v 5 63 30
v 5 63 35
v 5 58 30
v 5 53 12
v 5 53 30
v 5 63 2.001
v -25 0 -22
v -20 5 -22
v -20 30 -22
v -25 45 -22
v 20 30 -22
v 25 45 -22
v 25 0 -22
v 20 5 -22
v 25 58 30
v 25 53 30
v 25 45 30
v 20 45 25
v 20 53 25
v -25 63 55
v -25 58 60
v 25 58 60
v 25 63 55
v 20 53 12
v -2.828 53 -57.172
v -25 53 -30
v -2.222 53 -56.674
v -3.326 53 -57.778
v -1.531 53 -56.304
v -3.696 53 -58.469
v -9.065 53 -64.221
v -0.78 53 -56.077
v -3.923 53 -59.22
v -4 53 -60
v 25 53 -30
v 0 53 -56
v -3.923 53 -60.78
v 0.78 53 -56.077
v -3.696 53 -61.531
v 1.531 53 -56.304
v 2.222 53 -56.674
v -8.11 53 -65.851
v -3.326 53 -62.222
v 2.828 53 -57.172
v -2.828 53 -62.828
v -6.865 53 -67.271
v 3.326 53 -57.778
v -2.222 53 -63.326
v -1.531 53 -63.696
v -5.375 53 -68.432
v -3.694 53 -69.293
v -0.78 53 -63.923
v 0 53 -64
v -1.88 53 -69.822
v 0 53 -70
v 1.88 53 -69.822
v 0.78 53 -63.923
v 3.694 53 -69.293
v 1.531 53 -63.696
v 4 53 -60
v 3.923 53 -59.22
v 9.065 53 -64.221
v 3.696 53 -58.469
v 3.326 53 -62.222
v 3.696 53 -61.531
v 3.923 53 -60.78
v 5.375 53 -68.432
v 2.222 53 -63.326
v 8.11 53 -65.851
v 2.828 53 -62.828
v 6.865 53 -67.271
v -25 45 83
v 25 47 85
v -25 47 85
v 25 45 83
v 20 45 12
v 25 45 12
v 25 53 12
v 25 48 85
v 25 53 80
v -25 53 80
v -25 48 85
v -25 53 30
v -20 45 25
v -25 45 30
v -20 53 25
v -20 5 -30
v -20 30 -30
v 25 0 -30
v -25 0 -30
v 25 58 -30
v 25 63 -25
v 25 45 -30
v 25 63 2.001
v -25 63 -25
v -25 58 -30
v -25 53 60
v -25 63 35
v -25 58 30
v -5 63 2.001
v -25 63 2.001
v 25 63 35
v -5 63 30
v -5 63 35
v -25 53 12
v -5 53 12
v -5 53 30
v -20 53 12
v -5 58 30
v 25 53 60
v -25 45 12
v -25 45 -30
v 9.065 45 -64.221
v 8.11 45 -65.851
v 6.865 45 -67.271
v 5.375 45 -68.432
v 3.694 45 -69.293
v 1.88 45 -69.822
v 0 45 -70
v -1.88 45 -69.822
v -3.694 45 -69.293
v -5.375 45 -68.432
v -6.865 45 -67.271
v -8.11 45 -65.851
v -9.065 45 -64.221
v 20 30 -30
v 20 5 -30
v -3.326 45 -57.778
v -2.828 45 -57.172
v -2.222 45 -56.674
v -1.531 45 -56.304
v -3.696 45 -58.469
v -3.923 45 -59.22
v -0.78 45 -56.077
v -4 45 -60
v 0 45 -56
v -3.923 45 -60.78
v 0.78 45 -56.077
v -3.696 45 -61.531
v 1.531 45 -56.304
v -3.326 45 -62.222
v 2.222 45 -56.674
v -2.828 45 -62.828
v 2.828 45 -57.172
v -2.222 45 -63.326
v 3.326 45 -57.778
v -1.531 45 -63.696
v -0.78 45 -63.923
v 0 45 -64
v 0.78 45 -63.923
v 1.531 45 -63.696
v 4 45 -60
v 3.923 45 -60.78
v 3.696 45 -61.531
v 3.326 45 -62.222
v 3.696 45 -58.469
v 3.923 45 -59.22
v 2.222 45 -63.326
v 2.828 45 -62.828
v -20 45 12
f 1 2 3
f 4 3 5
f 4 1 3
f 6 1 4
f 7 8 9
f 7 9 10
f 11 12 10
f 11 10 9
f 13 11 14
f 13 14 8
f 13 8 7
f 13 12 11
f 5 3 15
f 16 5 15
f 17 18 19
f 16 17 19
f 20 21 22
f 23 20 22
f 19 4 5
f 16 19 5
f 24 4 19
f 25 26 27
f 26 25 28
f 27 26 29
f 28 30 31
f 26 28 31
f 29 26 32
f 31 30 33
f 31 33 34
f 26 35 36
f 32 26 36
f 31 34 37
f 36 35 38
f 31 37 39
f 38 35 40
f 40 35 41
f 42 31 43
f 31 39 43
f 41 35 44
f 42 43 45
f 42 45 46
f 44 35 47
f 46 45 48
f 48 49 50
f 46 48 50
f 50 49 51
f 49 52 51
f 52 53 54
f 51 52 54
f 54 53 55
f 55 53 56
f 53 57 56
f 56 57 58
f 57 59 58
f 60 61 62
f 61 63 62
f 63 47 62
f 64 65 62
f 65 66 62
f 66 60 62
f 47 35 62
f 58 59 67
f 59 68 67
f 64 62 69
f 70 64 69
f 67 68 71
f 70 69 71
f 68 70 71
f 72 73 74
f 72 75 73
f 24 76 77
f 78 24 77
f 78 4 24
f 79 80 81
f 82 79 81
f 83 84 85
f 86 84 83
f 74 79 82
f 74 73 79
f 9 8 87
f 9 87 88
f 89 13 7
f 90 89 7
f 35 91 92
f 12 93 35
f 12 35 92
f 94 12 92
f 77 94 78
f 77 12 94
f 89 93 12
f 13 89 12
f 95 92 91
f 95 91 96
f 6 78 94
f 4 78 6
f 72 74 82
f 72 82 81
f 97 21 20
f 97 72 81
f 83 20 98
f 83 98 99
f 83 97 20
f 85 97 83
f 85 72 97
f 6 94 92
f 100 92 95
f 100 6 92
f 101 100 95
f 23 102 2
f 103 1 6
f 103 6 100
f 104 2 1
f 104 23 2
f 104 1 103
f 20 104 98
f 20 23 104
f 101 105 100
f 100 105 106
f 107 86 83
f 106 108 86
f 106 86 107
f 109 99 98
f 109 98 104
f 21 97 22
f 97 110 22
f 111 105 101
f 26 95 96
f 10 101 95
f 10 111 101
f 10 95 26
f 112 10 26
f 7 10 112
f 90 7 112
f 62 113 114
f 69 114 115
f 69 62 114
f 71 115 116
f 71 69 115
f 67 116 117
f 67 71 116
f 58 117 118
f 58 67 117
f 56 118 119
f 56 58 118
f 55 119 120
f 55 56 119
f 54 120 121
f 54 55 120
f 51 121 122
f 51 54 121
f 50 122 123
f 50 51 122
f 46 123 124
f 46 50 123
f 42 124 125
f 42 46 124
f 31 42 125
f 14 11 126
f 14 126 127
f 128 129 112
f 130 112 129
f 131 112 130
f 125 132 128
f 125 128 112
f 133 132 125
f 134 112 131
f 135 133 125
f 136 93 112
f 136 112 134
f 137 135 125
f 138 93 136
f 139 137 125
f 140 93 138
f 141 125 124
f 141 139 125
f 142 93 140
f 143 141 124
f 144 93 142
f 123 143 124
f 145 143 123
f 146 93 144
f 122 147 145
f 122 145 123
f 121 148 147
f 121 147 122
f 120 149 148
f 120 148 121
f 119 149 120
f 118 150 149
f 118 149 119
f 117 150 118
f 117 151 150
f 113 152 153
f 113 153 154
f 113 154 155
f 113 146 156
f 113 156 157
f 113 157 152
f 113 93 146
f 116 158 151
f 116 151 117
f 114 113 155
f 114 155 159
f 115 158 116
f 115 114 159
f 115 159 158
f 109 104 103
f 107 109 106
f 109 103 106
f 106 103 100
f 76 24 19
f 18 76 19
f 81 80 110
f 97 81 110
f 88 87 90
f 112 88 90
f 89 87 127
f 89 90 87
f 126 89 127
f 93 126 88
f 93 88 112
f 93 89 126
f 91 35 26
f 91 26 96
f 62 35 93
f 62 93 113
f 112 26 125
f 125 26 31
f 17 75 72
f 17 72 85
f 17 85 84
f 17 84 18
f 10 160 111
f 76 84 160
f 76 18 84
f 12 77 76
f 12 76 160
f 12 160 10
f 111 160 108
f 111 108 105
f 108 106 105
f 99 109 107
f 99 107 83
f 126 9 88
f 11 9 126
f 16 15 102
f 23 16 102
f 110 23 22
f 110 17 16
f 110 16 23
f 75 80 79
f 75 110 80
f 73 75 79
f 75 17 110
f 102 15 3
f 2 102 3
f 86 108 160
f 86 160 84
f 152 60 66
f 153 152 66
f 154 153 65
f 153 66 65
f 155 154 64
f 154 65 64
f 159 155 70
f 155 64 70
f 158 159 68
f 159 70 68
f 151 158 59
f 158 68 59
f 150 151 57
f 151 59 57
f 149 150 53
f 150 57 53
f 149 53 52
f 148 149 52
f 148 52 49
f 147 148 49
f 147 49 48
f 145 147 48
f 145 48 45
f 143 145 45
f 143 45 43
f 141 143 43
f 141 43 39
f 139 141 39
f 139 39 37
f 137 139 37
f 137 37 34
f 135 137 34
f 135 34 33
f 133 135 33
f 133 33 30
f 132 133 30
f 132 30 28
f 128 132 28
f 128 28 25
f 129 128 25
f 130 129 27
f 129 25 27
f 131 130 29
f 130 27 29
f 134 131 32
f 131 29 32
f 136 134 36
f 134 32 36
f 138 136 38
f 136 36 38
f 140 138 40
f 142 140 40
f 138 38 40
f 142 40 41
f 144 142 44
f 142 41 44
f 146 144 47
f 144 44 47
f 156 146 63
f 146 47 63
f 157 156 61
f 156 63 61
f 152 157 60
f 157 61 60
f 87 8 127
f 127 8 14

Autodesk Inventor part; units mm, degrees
ref_plane "YZ Plane" through (0, 0, 0) normal (1, 0, 0) x (0, 1, 0)
ref_plane "XZ Plane" through (0, 0, 0) normal (0, 1, 0) x (-1, 0, 0)
ref_plane "XY Plane" through (0, 0, 0) normal (0, 0, 1) x (1, 0, 0)
sketch "Sketch1" plane through (0, 0, 0) normal (0, 1, 0) x (-1, 0, 0)
  line L0 (0, 85) -> (0, -85)
  line L1 (25, 0) -> (-25, 0)
  line L2 (0, 85) -> (25, 85)
  line L3 (25, 85) -> (25, -85)
  line L4 (25, -85) -> (-25, -85)
  line L5 (-25, -85) -> (-25, 85)
  line L6 (-25, 85) -> (0, 85)
  point P0 (0, 0)
  point P1 (0, 0)
  point P2 (0, 0)
  dimension "d1" = 50
extrude "Extrusion1" add sketch "Sketch1" along normal blind 63
sketch "Sketch2" plane through (25, 0, 85) normal (1, 0, 0) x (0, 0, -1)
  line L0 (0, 0) -> (170, 0) projected
  line L1 (170, 0) -> (170, 63) projected
  line L2 (0, 63) -> (170, 63) projected
  line L3 (0, 0) -> (0, 63) projected
  line L4 (0, 0) -> (170, 0) projected
  line L5 (0, 0) -> (0, 45)
  line L6 (0, 0) -> (0, 63) projected
  line L7 (0, 45) -> (107, 45)
  line L8 (107, 45) -> (107, 0)
  point P0 (85, 0)
  dimension "d4" = 45
  dimension "d5" = 107
extrude "Extrusion2" cut sketch "Sketch2" against normal up to next contours L3 L7 L8 L0
sketch "Sketch3" plane through (25, 0, -22) normal (0, 0, 1) x (1, 0, 0)
  line L0 (-50, 0) -> (-50, 45) projected
  line L1 (0, 0) -> (-50, 0) projected
  line L2 (0, 45) -> (0, 0) projected
  line L3 (0, 45) -> (-50, 45) projected
  line L4 (-45, 5) -> (-5, 5)
  line L5 (-5, 30) -> (-5, 5)
  line L6 (-45, 5) -> (-45, 30)
  line L7 (-45, 30) -> (-5, 30)
  point P0 (-25, 0)
  dimension "d10" = 25
  dimension "d11" = 5
  dimension "d12" = 5
  dimension "d13" = 5
extrude "Extrusion3" cut sketch "Sketch3" against normal up to next contours L6 L7 L5 L4
sketch "Sketch4" plane through (25, 0, -85) normal (1, 0, 0) x (0, 0, -1)
  line L0 (-63, 45) -> (-63, 0) projected
  line L1 (-63, 0) -> (0, 0) projected
  line L2 (0, 0) -> (0, 63) projected
  line L3 (-170, 63) -> (0, 63) projected
  line L4 (-170, 45) -> (-170, 63) projected
  line L5 (-170, 45) -> (-63, 45) projected
  line L6 (-170, 45) -> (-165, 45)
  line L7 (-170, 45) -> (-63, 45) projected
  line L8 (-165, 45) -> (-165, 63)
  line L9 (-170, 63) -> (0, 63) projected
  line L10 (-170, 45) -> (-170, 53)
  line L11 (-170, 45) -> (-170, 63) projected
  line L12 (-170, 53) -> (-165, 53)
  line L13 (-170, 53) -> (-170, 63)
  point P0 (-85, 0)
  dimension "d16" = 5
  dimension "d20" = 8
chamfer "Chamfer1" distance 2 angle 45 1 edges at (0, 45, 85)
extrude "Extrusion4" cut sketch "Sketch4" against normal up to next contours L12 L4 L3 L8
chamfer "Chamfer2" distance 5 angle 45 1 edges at (0, 53, 85)
sketch "Sketch5" plane through (25, 0, -85) normal (1, 0, 0) x (0, 0, -1)
  line L0 (-170, 48) -> (-165, 53) projected
  line L1 (-170, 47) -> (-170, 48) projected
  line L2 (-168, 45) -> (-170, 47) projected
  line L3 (-168, 45) -> (-63, 45) projected
  line L4 (-63, 45) -> (-63, 0) projected
  line L5 (-63, 0) -> (0, 0) projected
  line L6 (0, 0) -> (0, 63) projected
  line L7 (-165, 63) -> (0, 63) projected
  line L8 (-165, 63) -> (-165, 53) projected
  line L9 (-165, 53) -> (-165, 63) projected
  line L10 (-165, 53) -> (-145, 53)
  line L11 (-145, 53) -> (-145, 63)
  point P0 (-85, 0)
  dimension "d26" = 20
extrude "Extrusion5" cut sketch "Sketch5" against normal up to next contours L8 L7 L11 L10
chamfer "Chamfer3" distance 5 angle 45 1 edges at (0, 63, 60)
sketch "Sketch6" plane through (25, 0, -85) normal (1, 0, 0) x (0, 0, -1)
  line L0 (-145, 58) -> (-140, 63) projected
  line L1 (-145, 58) -> (-145, 53) projected
  line L2 (-145, 53) -> (-165, 53) projected
  line L3 (-170, 48) -> (-165, 53) projected
  line L4 (-170, 47) -> (-170, 48) projected
  line L5 (-168, 45) -> (-170, 47) projected
  line L6 (-168, 45) -> (-63, 45) projected
  line L7 (-63, 45) -> (-63, 0) projected
  line L8 (-63, 0) -> (0, 0) projected
  line L9 (0, 0) -> (0, 63) projected
  line L10 (-140, 63) -> (0, 63) projected
  line L11 (-170, 47) -> (-170, 0)
  line L12 (-170, 0) -> (-40, 0)
  line L13 (-63, 0) -> (0, 0) projected
  line L14 (-170, 0) -> (-55, 0)
  line L15 (-55, 0) -> (-55, 45)
  line L16 (-55, 45) -> (0, 45)
  line L17 (0, 0) -> (0, 63) projected
  line L18 (-55, 45) -> (-55, 53)
  line L19 (-55, 53) -> (0, 53)
  line L20 (-55, 53) -> (-55, 63)
  line L21 (0, 63) -> (-140, 63) projected
  line L22 (-55, 63) -> (0, 63)
  point P0 (-85, 0)
  dimension "d32" = 130
  dimension "d33" = 115
  dimension "d34" = 8
extrude "Extrusion6" cut sketch "Sketch6" against normal up to next contours L10 L9 L19 L20 | L16 L9 L8 L15
sketch "Sketch7" plane through (25, 53, -30) normal (0, 1, 0) x (1, 0, 0)
  line L0 (-50, 0) -> (-50, 55) projected
  line L1 (0, 0) -> (-50, 0) projected
  line L2 (0, 55) -> (0, 0) projected
  line L3 (-50, 55) -> (0, 55) projected
  line L4 (0, 0) -> (0, 30)
  line L5 (0, 0) -> (0, 55) projected
  line L6 (0, 30) -> (-50, 30)
  line L7 (-25, -30) -> (-25, 55)
  circle A0 centre (-25, 30) radius 4
  circle A1 centre (-25, 30) radius 10
  line L8 (0, 0) -> (-15.9346, 34.2212)
  line L9 (-50, 0) -> (-34.0654, 34.2212)
  dimension "d37" = 30
  dimension "d38" = 8
  dimension "d39" = 20
extrude "Extrusion7" cut sketch "Sketch7" against normal up to next contours L0 L6 L9 | L0 L3 L7 A1 L9 L6 | L8 L6 L2 | L3 L2 L6 L8 A1 L7 | A0 L6 L7 | L7 L6 A0 | A0 L7 L6 | L7 A0 L6
chamfer "Chamfer4" distance 5 angle 45 1 edges at (0, 63, -30)
sketch "Sketch8" plane through (0, 63, 0) normal (0, 1, 0) x (1, 0, 0)
  line L0 (-25, -85) -> (25, -85) projected
  line L1 (-25, 25) -> (25, 25) projected
  line L2 (-25, 25) -> (-25, -55) projected
  line L3 (25, -55) -> (-25, -55) projected
  line L4 (25, -55) -> (25, 25) projected
  line L5 (25, -85) -> (-25, -85) projected
  line L6 (25, -85) -> (36, -85)
  line L7 (36, -85) -> (36, -5)
  line L8 (25, -55) -> (25, -30)
  line L9 (25, -55) -> (25, 25) projected
  line L10 (5, -30) -> (25, -30)
  line L11 (5, -30) -> (5, -12)
  line L12 (5, -12) -> (25, -12)
  line L13 (0, -38) -> (0, 17)
  line L14 (-5, -30) -> (-25, -30)
  line L15 (-5, -30) -> (-5, -12)
  line L16 (-5, -12) -> (-25, -12)
  point P0 (0, 0)
  dimension "d45" = 80
  dimension "d46" = 25
  dimension "d47" = 20
  dimension "d48" = 18
extrude "Extrusion8" cut sketch "Sketch8" against normal blind 10 contours L16 L15 L14 L2 | L4 L10 L11 L12
chamfer "Chamfer5" distance 10 angle 45 1 edges at (15, 63, 12)
chamfer "Chamfer6" distance 10 angle 45 1 edges at (-15, 63, 12)
sketch "Sketch9" plane through (0, 53, 0) normal (0, 1, 0) x (1, 0, 0)
  line L0 (25, -30) -> (5, -30) projected
  line L1 (25, -12) -> (25, -30) projected
  line L2 (5, -12) -> (25, -12) projected
  line L3 (5, -30) -> (5, -12) projected
  line L4 (-25, -12) -> (-5, -12) projected
  line L5 (-25, -30) -> (-25, -12) projected
  line L6 (-5, -30) -> (-25, -30) projected
  line L7 (-5, -12) -> (-5, -30) projected
  line L8 (0, 0) -> (0, -34)
  line L9 (25, -12) -> (20, -12)
  line L10 (20, -12) -> (20, -25)
  line L11 (20, -25) -> (25, -25)
  line L12 (25, -83) -> (25, 22) projected
  line L13 (-5, -12) -> (-25, -12)
  line L14 (-20, -12) -> (-20, -25)
  line L15 (-20, -25) -> (-25, -25)
  dimension "d57" = 5
  dimension "d58" = 13
extrude "Extrusion9" cut sketch "Sketch9" against normal up to next contours L11 L10 L2 L1 | L4 L14 L15 L5
chamfer "Chamfer7" distance 5 angle 45 4 edges at (15, 63, 30) (-15, 63, 30) (25, 49, 25) (-25, 49, 25)
properties part number "PIEZA_3D_1EX"
